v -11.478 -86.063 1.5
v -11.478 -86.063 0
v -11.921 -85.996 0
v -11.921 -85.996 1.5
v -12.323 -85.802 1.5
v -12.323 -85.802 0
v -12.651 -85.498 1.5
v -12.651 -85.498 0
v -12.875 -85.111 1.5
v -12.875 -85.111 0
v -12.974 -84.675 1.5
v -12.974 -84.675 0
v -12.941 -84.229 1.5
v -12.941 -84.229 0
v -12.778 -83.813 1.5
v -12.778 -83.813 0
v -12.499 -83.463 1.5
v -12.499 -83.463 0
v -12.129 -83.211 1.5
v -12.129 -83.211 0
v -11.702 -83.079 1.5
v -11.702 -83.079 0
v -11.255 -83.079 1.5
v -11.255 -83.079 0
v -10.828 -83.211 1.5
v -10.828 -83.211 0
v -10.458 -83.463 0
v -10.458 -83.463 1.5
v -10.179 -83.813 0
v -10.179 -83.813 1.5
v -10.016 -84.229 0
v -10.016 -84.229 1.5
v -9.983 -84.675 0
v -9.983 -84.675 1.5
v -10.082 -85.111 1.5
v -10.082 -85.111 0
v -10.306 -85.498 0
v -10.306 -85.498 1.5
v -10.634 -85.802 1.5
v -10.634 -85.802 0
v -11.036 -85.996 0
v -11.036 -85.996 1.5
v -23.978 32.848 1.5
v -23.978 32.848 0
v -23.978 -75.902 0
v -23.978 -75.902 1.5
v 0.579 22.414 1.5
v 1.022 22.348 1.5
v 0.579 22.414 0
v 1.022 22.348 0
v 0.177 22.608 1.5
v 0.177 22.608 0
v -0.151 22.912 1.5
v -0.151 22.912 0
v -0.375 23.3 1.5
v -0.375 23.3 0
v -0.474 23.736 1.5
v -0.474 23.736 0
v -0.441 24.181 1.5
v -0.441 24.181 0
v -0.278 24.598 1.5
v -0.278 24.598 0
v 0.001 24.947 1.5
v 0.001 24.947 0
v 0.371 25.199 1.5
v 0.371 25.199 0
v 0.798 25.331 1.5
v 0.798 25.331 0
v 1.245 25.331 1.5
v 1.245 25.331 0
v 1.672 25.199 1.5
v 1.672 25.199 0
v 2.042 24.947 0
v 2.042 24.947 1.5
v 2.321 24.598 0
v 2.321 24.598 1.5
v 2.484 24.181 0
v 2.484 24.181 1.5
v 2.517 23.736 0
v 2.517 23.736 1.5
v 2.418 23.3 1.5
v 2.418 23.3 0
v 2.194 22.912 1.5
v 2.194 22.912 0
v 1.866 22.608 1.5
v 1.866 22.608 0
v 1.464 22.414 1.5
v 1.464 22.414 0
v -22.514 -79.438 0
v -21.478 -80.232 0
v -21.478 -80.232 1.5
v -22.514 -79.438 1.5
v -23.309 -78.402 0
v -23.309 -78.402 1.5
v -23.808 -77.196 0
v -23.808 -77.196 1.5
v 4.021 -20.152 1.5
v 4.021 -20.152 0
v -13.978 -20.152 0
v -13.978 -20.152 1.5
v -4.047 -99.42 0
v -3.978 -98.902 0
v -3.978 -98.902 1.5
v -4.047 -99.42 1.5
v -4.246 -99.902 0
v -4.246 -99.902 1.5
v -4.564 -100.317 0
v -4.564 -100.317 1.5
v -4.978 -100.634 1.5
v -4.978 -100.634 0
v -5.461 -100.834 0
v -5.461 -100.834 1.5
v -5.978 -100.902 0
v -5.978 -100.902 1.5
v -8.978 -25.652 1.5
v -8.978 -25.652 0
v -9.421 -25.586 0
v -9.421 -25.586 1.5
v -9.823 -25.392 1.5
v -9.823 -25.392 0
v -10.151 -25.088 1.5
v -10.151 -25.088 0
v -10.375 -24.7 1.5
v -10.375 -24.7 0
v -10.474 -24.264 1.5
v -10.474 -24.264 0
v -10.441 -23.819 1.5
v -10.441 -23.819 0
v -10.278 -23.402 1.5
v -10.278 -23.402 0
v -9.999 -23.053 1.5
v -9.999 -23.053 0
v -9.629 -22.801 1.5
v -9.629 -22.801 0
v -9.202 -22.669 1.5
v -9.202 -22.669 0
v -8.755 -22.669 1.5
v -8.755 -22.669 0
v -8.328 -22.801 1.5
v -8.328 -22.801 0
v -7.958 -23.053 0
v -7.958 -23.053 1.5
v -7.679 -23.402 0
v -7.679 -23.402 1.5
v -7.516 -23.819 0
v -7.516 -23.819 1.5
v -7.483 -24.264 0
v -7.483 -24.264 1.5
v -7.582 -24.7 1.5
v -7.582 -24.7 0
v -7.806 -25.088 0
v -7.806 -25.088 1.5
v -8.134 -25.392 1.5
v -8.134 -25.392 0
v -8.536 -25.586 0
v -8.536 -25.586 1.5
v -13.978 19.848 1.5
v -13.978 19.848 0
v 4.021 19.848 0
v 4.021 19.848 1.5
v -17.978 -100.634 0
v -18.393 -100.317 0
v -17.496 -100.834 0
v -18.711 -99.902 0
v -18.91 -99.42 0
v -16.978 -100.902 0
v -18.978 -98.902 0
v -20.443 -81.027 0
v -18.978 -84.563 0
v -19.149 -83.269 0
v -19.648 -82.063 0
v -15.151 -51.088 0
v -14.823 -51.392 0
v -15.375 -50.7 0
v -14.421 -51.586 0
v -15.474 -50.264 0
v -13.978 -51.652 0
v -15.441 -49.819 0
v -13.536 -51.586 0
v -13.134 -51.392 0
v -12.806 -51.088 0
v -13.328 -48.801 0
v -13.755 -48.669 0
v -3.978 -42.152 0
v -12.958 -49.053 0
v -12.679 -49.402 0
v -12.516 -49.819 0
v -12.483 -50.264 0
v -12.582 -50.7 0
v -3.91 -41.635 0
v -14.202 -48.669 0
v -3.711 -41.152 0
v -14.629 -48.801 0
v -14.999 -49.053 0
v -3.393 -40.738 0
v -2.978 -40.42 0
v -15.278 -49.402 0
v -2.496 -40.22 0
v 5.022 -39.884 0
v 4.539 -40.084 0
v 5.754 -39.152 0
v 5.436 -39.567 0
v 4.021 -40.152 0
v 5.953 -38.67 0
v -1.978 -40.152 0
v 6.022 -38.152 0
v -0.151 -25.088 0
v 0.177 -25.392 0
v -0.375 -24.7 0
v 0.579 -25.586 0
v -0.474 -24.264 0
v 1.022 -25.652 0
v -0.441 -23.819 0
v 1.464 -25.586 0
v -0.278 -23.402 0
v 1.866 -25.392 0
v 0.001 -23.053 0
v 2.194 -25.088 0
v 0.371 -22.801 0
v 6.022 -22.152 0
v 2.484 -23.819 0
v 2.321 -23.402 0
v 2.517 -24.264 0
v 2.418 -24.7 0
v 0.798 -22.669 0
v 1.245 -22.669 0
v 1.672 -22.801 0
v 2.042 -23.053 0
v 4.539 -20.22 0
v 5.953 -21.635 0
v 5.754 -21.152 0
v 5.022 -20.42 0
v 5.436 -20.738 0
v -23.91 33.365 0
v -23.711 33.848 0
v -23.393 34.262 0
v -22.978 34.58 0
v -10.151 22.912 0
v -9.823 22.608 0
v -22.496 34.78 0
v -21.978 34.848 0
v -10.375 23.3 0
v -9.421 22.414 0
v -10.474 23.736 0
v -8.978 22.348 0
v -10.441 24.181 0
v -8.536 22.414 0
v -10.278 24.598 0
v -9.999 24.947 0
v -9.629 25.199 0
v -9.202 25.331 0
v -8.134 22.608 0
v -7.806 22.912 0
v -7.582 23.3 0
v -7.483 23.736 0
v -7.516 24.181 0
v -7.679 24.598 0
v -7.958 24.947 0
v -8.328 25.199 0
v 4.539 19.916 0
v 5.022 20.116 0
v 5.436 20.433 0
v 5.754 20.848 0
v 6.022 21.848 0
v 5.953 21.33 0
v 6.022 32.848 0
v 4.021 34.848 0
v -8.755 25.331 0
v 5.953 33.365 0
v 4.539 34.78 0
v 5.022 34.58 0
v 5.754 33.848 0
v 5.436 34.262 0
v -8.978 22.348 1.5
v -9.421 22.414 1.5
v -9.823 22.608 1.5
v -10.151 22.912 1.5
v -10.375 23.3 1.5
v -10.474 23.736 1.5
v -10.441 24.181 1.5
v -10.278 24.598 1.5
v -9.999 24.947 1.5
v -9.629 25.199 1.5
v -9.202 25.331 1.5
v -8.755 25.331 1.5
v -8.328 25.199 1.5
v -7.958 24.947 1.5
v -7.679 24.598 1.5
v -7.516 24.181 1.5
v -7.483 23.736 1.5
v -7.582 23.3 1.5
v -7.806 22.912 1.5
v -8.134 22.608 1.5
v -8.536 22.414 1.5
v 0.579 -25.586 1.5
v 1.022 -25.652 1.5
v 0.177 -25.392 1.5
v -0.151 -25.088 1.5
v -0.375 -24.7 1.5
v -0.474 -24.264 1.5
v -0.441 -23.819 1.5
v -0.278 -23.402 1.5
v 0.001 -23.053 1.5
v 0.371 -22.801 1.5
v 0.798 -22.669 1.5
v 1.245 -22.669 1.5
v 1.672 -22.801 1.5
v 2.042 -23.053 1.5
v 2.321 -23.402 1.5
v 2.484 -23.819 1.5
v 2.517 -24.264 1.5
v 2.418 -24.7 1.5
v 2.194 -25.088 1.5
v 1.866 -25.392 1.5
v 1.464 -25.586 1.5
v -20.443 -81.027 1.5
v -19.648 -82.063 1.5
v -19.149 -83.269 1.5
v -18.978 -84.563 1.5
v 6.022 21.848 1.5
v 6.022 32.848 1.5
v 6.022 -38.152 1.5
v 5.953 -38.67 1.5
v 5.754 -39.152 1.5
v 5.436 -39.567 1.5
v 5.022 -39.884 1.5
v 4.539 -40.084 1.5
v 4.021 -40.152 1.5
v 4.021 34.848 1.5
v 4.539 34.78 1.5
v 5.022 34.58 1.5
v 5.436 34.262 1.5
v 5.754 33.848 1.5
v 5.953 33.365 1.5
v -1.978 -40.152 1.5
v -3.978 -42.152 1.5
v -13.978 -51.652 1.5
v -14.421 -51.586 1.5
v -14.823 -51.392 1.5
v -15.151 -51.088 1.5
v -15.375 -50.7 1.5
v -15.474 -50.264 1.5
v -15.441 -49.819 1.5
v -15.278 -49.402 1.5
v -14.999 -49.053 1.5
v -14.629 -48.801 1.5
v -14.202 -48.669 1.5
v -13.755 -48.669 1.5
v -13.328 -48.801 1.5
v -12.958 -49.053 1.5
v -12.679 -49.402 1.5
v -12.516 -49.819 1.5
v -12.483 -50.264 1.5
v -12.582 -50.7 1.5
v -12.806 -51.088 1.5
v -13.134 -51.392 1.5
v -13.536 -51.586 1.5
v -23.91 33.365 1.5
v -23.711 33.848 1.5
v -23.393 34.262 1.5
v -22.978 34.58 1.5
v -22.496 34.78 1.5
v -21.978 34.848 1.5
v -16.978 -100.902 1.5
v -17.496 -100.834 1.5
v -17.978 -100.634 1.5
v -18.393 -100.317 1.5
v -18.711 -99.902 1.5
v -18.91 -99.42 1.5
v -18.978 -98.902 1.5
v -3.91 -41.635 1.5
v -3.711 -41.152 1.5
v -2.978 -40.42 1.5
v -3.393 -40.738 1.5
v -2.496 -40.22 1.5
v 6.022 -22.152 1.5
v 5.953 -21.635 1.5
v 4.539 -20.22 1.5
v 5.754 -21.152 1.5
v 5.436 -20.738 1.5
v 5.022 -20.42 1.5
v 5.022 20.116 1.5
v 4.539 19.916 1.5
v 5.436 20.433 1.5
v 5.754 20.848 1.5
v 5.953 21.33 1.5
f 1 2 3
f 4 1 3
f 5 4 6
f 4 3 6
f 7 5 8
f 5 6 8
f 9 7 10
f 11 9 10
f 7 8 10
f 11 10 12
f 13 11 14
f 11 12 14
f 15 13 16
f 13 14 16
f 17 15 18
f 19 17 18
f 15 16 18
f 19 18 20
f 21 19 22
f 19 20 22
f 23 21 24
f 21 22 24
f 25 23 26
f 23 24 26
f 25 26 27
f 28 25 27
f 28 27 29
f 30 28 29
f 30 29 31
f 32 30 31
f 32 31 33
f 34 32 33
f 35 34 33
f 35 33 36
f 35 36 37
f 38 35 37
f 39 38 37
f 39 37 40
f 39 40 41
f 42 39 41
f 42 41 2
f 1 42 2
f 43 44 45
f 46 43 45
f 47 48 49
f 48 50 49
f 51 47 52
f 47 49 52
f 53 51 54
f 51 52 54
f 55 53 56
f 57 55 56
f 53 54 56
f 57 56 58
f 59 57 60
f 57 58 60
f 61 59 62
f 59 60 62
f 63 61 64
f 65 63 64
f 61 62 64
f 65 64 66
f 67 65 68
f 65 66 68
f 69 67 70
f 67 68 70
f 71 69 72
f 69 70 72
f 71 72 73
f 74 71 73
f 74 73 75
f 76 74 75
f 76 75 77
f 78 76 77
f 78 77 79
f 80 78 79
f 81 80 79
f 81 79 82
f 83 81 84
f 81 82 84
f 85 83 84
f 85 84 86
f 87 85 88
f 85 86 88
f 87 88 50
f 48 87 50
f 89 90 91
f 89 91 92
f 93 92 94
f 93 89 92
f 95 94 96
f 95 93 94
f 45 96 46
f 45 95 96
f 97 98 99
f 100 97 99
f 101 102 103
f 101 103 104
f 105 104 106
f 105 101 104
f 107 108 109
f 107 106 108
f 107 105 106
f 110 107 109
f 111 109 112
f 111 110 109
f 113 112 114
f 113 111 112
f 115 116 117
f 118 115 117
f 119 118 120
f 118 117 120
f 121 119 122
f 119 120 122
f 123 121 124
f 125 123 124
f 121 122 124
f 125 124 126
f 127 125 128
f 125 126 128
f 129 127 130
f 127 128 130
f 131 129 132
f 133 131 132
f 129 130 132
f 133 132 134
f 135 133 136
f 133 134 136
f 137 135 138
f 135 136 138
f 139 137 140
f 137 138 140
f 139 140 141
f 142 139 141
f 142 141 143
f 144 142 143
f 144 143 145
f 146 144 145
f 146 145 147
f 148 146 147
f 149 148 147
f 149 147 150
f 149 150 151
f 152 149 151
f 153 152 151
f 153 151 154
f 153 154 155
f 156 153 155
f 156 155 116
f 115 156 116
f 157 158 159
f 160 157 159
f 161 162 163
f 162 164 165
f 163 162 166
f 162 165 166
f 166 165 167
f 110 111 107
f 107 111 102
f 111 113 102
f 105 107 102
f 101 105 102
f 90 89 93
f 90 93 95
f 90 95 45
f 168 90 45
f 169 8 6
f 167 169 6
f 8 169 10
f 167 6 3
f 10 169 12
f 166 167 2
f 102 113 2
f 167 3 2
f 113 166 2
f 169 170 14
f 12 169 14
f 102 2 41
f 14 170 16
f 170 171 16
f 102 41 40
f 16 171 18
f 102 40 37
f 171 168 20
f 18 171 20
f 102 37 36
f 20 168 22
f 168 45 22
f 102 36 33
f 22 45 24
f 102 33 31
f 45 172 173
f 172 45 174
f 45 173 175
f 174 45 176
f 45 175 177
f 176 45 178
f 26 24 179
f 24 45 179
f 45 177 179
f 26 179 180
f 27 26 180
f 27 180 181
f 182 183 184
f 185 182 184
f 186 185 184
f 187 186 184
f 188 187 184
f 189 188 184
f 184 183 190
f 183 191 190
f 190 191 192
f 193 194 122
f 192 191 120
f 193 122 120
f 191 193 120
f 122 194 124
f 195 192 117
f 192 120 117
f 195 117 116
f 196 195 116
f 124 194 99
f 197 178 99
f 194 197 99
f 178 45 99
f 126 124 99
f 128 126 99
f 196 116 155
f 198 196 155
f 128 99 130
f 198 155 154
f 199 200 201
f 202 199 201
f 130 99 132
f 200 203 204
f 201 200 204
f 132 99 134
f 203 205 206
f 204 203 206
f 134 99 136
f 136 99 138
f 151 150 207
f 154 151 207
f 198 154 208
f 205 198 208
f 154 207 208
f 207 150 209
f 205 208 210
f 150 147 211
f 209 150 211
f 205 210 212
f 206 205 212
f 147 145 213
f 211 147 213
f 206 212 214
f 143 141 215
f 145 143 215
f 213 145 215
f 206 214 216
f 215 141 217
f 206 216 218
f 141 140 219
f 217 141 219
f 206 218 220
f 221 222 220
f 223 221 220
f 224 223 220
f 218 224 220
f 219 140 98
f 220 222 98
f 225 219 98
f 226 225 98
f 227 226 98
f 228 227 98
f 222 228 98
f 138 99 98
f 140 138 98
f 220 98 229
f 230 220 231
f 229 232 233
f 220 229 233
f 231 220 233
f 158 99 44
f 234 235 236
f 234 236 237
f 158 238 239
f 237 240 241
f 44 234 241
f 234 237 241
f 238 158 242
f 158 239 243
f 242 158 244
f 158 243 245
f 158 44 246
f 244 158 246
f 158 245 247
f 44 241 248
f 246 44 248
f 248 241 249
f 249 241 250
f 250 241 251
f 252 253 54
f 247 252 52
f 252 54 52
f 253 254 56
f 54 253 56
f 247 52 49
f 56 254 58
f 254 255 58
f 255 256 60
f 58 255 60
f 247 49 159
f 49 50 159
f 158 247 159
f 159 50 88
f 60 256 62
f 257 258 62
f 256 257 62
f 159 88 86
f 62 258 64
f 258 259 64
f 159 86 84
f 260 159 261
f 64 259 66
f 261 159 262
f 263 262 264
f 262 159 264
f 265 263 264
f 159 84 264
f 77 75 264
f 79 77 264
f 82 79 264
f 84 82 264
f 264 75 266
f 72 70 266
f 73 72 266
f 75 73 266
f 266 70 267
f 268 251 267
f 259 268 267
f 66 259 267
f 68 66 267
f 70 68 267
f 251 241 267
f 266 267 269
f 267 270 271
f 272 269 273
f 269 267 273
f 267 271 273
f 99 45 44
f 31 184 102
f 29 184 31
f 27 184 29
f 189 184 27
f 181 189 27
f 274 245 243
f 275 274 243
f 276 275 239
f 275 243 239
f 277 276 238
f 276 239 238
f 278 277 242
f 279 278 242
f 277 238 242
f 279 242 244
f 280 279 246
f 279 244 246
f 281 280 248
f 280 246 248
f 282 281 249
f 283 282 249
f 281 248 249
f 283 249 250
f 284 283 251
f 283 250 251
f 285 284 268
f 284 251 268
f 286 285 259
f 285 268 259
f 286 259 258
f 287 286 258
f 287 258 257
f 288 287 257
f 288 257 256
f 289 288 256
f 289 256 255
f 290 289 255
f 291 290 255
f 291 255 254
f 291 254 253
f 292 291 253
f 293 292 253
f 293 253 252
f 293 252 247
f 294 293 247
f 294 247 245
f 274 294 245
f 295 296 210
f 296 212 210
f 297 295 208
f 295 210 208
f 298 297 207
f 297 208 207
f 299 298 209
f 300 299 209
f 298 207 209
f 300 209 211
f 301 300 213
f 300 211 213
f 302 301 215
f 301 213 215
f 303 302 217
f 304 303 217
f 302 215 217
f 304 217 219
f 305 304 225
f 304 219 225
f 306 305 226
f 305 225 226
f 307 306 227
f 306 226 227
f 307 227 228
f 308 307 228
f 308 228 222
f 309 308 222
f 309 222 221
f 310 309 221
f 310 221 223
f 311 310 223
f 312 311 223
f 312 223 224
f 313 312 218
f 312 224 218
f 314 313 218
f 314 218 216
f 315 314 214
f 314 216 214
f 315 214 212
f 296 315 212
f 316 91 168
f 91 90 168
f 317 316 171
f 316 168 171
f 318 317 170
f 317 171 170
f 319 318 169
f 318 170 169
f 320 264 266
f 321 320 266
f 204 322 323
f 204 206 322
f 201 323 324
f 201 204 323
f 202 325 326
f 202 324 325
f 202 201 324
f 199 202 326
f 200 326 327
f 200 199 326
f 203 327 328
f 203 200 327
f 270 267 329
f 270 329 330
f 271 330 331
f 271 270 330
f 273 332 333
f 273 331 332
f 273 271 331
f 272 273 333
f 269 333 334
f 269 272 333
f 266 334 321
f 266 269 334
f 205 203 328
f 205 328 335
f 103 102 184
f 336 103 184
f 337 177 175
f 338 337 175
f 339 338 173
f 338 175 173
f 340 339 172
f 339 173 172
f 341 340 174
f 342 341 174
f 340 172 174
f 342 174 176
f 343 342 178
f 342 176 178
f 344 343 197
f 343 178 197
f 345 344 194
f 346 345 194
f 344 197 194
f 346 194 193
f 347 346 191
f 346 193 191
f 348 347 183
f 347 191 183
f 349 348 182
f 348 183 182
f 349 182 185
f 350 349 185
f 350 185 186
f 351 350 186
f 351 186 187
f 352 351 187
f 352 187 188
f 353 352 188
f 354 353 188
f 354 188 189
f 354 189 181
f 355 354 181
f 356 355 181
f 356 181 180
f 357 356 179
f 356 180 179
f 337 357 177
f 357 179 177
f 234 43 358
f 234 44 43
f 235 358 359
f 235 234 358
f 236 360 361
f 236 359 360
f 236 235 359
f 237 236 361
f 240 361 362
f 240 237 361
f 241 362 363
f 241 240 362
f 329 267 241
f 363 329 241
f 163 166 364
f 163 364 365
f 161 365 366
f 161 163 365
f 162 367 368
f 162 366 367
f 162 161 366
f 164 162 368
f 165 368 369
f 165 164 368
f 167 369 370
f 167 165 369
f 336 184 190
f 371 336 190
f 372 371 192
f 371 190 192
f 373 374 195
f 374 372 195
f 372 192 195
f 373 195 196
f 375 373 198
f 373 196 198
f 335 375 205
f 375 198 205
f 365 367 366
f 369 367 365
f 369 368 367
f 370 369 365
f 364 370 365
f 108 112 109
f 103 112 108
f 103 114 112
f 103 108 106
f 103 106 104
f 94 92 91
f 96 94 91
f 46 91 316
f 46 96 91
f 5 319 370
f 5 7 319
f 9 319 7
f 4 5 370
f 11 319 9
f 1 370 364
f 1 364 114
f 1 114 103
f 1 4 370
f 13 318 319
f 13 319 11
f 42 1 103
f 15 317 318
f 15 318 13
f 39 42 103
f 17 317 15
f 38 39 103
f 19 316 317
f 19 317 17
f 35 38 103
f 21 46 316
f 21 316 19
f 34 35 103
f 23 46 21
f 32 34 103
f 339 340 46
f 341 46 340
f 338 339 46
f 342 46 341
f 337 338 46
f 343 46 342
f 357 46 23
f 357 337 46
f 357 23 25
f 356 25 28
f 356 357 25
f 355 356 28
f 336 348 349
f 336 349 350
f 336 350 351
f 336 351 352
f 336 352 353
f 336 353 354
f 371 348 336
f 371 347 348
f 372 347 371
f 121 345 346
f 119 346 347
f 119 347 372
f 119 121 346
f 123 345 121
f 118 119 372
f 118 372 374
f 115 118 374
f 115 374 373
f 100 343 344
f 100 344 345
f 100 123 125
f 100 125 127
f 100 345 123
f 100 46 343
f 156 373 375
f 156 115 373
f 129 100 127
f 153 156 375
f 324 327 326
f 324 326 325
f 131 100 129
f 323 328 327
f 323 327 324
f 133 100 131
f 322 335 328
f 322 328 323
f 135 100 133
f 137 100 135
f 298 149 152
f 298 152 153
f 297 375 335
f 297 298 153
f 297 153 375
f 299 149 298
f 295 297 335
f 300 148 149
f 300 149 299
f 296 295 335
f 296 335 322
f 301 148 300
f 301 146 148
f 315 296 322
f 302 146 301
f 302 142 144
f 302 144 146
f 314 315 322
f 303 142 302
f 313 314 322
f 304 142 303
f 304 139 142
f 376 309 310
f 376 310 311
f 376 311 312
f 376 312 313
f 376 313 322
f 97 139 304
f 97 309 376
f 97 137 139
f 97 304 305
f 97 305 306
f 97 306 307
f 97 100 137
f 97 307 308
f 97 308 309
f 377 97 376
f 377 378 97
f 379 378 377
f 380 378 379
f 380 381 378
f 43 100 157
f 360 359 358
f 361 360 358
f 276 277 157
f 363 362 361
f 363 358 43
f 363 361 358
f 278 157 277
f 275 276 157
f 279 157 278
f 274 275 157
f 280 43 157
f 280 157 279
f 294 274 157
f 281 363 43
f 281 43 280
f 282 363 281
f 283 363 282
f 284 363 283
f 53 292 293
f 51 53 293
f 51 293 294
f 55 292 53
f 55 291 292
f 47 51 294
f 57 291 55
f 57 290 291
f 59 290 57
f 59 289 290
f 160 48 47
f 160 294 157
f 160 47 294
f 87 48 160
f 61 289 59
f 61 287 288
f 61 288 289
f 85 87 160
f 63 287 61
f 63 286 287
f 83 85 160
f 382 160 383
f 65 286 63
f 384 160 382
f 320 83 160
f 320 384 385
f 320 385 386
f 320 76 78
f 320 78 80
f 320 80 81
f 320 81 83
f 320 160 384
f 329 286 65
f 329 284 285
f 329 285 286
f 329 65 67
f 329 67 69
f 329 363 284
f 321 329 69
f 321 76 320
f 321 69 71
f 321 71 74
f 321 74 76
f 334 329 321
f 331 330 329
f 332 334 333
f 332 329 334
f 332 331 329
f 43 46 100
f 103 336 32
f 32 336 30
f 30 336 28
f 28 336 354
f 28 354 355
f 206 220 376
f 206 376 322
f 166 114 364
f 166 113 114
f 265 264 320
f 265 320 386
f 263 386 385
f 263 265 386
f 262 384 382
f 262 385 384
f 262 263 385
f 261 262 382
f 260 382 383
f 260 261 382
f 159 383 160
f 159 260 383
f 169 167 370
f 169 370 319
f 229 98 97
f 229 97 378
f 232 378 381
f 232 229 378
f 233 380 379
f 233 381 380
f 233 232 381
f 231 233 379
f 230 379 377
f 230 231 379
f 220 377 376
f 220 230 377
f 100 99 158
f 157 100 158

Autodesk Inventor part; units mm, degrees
ref_plane "YZ Plane" through (0, 0, 0) normal (1, 0, 0) x (0, 1, 0)
ref_plane "XZ Plane" through (0, 0, 0) normal (0, 1, 0) x (-1, 0, 0)
sketch "Sketch1" plane through (0, 0, 0) normal (0, 0, 1) x (1, 0, 0)
  line L0 (-13.9785, 19.8477) -> (4.0215, 19.8477)
  line L1 (4.0215, -20.1523) -> (-13.9785, -20.1523)
  line L2 (-13.9785, -20.1523) -> (-13.9785, 19.8477)
  line L3 (6.0215, -22.1523) -> (6.0215, -38.1523)
  line L4 (6.0215, 21.8477) -> (6.0215, 32.8477)
  circle A0 centre (-3.9785, -10.9023) radius 2.5
  line L5 (6.0215, 19.8477) -> (6.0215, 34.8477)
  line L6 (6.0215, -20.1523) -> (6.0215, -40.1523)
  line L7 (4.0215, -40.1523) -> (-1.9785, -40.1523)
  line L8 (-3.9785, -80.9023) -> (-3.9785, -95.9023)
  line L9 (-3.9785, -98.9023) -> (-3.9785, -42.1523)
  line L10 (-23.9785, 32.8477) -> (-23.9785, -75.9023)
  line L11 (6.0215, 19.8477) -> (6.0215, 34.8477)
  circle A1 centre (-8.9785, -24.1523) radius 1.5
  circle A2 centre (1.0215, -24.1523) radius 1.5
  circle A3 centre (-8.9785, 23.8477) radius 1.5
  circle A4 centre (1.0215, 23.8477) radius 1.5
  line L12 (-5.9785, -100.9023) -> (-16.9785, -100.9023)
  line L13 (6.0215, 19.8477) -> (6.0215, 21.4291)
  line L14 (6.0215, 19.8477) -> (6.0215, 34.8477)
  line L15 (4.0215, 34.8477) -> (-21.9785, 34.8477)
  line L16 (-18.9785, -98.9023) -> (-18.9785, -84.5626)
  line L17 (-18.9785, -80.9023) -> (-18.9785, -80.9023)
  arc A5 (-18.9785, -98.9023) -> (-16.9785, -100.9023) centre (-16.9785, -98.9023) ccw
  arc A6 (-5.9785, -100.9023) -> (-3.9785, -98.9023) centre (-5.9785, -98.9023) ccw
  arc A7 (-1.9785, -40.1523) -> (-3.9785, -42.1523) centre (-1.9785, -42.1523) ccw
  arc A8 (4.0215, -40.1523) -> (6.0215, -38.1523) centre (4.0215, -38.1523) ccw
  arc A9 (6.0215, -22.1523) -> (4.0215, -20.1523) centre (4.0215, -22.1523) ccw
  arc A10 (4.0215, 19.8477) -> (6.0215, 21.8477) centre (4.0215, 21.8477) ccw
  arc A11 (6.0215, 32.8477) -> (4.0215, 34.8477) centre (4.0215, 32.8477) ccw
  arc A12 (-21.9785, 34.8477) -> (-23.9785, 32.8477) centre (-21.9785, 32.8477) ccw
  arc A13 (-23.9785, -75.9023) -> (-21.4785, -80.2325) centre (-18.9785, -75.9023) ccw
  arc A14 (-18.9785, -84.5626) -> (-21.4785, -80.2325) centre (-23.9785, -84.5626) ccw
  circle A15 centre (-13.9785, -50.1523) radius 1.5
  circle A16 centre (-11.4785, -84.5626) radius 1.5
  point P0 (0, 0)
  point P1 (0, 0)
  point P2 (0, 0)
  point P3 (-23.9785, 34.8477)
  point P4 (-3.9785, -100.9023)
  point P5 (-18.9785, -100.9023)
  dimension "d0" = 5
  dimension "d1" = 20
  dimension "d2" = 3
  dimension "d3" = 5
  dimension "d4" = 4
  dimension "d5" = 3
  dimension "d6" = 10
  dimension "d7" = 3
  dimension "d8" = 3
  dimension "d9" = 10
  dimension "d10" = 5
  dimension "d11" = 4
  dimension "d14" = 15
  dimension "d15" = 135.75
  dimension "d18" = 10
  dimension "d19" = 15
  dimension "d21" = 30
  dimension "d22" = 2
  dimension "d23" = 5
  dimension "d26" = 3
  dimension "d27" = 3
  dimension "d29" = 30
  dimension "d62" = 48
  dimension "d63" = 48
extrude "Extrusion2" add sketch "Sketch1" along normal blind 1.5 contours L2 L1 A9 L3 A8 L7 A7 L9 L8 A6 L12 A5 L16 A14 A13 L10 A12 L15 A11 L4 A10 L0 | A1 | A2 | A3 | A4 | A15 | A16
ref_plane "Work Plane1" through (0, 0, 1.5) normal (0, 0, 1) x (1, 0, 0)
sketch "Sketch4" plane through (0, 0, 1.5) normal (0, 0, 1) x (1, 0, 0)
  line L0 (-13.9785, 19.8477) -> (4.0215, 19.8477)
  line L1 (4.0215, -20.1523) -> (-13.9785, -20.1523)
  line L2 (-13.9785, -20.1523) -> (-13.9785, 19.8477)
  line L3 (6.0215, -22.1523) -> (6.0215, -38.1523)
  line L4 (6.0215, 21.8477) -> (6.0215, 32.8477)
  circle A0 centre (-3.9785, -10.9023) radius 2.5
  line L5 (6.0215, 19.8477) -> (6.0215, 34.8477)
  line L6 (6.0215, -20.1523) -> (6.0215, -40.1523)
  line L7 (4.0215, -40.1523) -> (-1.9785, -40.1523)
  line L8 (-3.9785, -80.9023) -> (-3.9785, -95.9023)
  line L9 (-3.9785, -98.9023) -> (-3.9785, -42.1523)
  line L10 (-23.9785, 32.8477) -> (-23.9785, -75.9023)
  line L11 (6.0215, 19.8477) -> (6.0215, 34.8477)
  circle A1 centre (-8.9785, -24.1523) radius 1.5
  circle A2 centre (1.0215, -24.1523) radius 1.5
  circle A3 centre (-8.9785, 23.8477) radius 1.5
  circle A4 centre (1.0215, 23.8477) radius 1.5
  line L12 (-5.9785, -100.9023) -> (-16.9785, -100.9023)
  line L13 (6.0215, 19.8477) -> (6.0215, 21.4291)
  line L14 (6.0215, 19.8477) -> (6.0215, 34.8477)
  line L15 (4.0215, 34.8477) -> (-21.9785, 34.8477)
  line L16 (-18.9785, -98.9023) -> (-18.9785, -84.5626)
  line L17 (-18.9785, -80.9023) -> (-18.9785, -80.9023)
  arc A5 (-18.9785, -98.9023) -> (-16.9785, -100.9023) centre (-16.9785, -98.9023) ccw
  arc A6 (-5.9785, -100.9023) -> (-3.9785, -98.9023) centre (-5.9785, -98.9023) ccw
  arc A7 (-1.9785, -40.1523) -> (-3.9785, -42.1523) centre (-1.9785, -42.1523) ccw
  arc A8 (4.0215, -40.1523) -> (6.0215, -38.1523) centre (4.0215, -38.1523) ccw
  arc A9 (6.0215, -22.1523) -> (4.0215, -20.1523) centre (4.0215, -22.1523) ccw
  arc A10 (4.0215, 19.8477) -> (6.0215, 21.8477) centre (4.0215, 21.8477) ccw
  arc A11 (6.0215, 32.8477) -> (4.0215, 34.8477) centre (4.0215, 32.8477) ccw
  arc A12 (-21.9785, 34.8477) -> (-23.9785, 32.8477) centre (-21.9785, 32.8477) ccw
  arc A13 (-23.9785, -75.9023) -> (-21.4785, -80.2325) centre (-18.9785, -75.9023) ccw
  arc A14 (-18.9785, -84.5626) -> (-21.4785, -80.2325) centre (-23.9785, -84.5626) ccw
  circle A15 centre (-13.9785, -50.1523) radius 1.5
  circle A16 centre (-11.4785, -84.5626) radius 1.5
  point P0 (0, 0)
  point P1 (0, 0)
  point P2 (0, 0)
  point P3 (0, 0)
  point P4 (-23.9785, 34.8477)
  point P5 (-3.9785, -100.9023)
  point P6 (-18.9785, -100.9023)
  dimension "d33" = 5
  dimension "d34" = 20
  dimension "d35" = 3
  dimension "d36" = 5
  dimension "d37" = 4
  dimension "d38" = 3
  dimension "d39" = 10
  dimension "d40" = 3
  dimension "d41" = 3
  dimension "d42" = 10
  dimension "d43" = 5
  dimension "d44" = 4
  dimension "d45" = 15
  dimension "d46" = 135.75
  dimension "d47" = 10
  dimension "d48" = 15
  dimension "d49" = 30
  dimension "d50" = 2
  dimension "d51" = 5
  dimension "d52" = 3
  dimension "d53" = 3
  dimension "d54" = 30
hole "Hole1" at (-8.9785, 23.8477, 1.5) at (1.0215, 23.8477, 1.5) at (-8.9785, -24.1523, 1.5) at (1.0215, -24.1523, 1.5) at (-13.9785, -50.1523, 1.5) at (-11.4785, -84.5626, 1.5) direction (0, 0, -1) diameter 3 end through all
properties part number "riset tibia alumunium 1"
